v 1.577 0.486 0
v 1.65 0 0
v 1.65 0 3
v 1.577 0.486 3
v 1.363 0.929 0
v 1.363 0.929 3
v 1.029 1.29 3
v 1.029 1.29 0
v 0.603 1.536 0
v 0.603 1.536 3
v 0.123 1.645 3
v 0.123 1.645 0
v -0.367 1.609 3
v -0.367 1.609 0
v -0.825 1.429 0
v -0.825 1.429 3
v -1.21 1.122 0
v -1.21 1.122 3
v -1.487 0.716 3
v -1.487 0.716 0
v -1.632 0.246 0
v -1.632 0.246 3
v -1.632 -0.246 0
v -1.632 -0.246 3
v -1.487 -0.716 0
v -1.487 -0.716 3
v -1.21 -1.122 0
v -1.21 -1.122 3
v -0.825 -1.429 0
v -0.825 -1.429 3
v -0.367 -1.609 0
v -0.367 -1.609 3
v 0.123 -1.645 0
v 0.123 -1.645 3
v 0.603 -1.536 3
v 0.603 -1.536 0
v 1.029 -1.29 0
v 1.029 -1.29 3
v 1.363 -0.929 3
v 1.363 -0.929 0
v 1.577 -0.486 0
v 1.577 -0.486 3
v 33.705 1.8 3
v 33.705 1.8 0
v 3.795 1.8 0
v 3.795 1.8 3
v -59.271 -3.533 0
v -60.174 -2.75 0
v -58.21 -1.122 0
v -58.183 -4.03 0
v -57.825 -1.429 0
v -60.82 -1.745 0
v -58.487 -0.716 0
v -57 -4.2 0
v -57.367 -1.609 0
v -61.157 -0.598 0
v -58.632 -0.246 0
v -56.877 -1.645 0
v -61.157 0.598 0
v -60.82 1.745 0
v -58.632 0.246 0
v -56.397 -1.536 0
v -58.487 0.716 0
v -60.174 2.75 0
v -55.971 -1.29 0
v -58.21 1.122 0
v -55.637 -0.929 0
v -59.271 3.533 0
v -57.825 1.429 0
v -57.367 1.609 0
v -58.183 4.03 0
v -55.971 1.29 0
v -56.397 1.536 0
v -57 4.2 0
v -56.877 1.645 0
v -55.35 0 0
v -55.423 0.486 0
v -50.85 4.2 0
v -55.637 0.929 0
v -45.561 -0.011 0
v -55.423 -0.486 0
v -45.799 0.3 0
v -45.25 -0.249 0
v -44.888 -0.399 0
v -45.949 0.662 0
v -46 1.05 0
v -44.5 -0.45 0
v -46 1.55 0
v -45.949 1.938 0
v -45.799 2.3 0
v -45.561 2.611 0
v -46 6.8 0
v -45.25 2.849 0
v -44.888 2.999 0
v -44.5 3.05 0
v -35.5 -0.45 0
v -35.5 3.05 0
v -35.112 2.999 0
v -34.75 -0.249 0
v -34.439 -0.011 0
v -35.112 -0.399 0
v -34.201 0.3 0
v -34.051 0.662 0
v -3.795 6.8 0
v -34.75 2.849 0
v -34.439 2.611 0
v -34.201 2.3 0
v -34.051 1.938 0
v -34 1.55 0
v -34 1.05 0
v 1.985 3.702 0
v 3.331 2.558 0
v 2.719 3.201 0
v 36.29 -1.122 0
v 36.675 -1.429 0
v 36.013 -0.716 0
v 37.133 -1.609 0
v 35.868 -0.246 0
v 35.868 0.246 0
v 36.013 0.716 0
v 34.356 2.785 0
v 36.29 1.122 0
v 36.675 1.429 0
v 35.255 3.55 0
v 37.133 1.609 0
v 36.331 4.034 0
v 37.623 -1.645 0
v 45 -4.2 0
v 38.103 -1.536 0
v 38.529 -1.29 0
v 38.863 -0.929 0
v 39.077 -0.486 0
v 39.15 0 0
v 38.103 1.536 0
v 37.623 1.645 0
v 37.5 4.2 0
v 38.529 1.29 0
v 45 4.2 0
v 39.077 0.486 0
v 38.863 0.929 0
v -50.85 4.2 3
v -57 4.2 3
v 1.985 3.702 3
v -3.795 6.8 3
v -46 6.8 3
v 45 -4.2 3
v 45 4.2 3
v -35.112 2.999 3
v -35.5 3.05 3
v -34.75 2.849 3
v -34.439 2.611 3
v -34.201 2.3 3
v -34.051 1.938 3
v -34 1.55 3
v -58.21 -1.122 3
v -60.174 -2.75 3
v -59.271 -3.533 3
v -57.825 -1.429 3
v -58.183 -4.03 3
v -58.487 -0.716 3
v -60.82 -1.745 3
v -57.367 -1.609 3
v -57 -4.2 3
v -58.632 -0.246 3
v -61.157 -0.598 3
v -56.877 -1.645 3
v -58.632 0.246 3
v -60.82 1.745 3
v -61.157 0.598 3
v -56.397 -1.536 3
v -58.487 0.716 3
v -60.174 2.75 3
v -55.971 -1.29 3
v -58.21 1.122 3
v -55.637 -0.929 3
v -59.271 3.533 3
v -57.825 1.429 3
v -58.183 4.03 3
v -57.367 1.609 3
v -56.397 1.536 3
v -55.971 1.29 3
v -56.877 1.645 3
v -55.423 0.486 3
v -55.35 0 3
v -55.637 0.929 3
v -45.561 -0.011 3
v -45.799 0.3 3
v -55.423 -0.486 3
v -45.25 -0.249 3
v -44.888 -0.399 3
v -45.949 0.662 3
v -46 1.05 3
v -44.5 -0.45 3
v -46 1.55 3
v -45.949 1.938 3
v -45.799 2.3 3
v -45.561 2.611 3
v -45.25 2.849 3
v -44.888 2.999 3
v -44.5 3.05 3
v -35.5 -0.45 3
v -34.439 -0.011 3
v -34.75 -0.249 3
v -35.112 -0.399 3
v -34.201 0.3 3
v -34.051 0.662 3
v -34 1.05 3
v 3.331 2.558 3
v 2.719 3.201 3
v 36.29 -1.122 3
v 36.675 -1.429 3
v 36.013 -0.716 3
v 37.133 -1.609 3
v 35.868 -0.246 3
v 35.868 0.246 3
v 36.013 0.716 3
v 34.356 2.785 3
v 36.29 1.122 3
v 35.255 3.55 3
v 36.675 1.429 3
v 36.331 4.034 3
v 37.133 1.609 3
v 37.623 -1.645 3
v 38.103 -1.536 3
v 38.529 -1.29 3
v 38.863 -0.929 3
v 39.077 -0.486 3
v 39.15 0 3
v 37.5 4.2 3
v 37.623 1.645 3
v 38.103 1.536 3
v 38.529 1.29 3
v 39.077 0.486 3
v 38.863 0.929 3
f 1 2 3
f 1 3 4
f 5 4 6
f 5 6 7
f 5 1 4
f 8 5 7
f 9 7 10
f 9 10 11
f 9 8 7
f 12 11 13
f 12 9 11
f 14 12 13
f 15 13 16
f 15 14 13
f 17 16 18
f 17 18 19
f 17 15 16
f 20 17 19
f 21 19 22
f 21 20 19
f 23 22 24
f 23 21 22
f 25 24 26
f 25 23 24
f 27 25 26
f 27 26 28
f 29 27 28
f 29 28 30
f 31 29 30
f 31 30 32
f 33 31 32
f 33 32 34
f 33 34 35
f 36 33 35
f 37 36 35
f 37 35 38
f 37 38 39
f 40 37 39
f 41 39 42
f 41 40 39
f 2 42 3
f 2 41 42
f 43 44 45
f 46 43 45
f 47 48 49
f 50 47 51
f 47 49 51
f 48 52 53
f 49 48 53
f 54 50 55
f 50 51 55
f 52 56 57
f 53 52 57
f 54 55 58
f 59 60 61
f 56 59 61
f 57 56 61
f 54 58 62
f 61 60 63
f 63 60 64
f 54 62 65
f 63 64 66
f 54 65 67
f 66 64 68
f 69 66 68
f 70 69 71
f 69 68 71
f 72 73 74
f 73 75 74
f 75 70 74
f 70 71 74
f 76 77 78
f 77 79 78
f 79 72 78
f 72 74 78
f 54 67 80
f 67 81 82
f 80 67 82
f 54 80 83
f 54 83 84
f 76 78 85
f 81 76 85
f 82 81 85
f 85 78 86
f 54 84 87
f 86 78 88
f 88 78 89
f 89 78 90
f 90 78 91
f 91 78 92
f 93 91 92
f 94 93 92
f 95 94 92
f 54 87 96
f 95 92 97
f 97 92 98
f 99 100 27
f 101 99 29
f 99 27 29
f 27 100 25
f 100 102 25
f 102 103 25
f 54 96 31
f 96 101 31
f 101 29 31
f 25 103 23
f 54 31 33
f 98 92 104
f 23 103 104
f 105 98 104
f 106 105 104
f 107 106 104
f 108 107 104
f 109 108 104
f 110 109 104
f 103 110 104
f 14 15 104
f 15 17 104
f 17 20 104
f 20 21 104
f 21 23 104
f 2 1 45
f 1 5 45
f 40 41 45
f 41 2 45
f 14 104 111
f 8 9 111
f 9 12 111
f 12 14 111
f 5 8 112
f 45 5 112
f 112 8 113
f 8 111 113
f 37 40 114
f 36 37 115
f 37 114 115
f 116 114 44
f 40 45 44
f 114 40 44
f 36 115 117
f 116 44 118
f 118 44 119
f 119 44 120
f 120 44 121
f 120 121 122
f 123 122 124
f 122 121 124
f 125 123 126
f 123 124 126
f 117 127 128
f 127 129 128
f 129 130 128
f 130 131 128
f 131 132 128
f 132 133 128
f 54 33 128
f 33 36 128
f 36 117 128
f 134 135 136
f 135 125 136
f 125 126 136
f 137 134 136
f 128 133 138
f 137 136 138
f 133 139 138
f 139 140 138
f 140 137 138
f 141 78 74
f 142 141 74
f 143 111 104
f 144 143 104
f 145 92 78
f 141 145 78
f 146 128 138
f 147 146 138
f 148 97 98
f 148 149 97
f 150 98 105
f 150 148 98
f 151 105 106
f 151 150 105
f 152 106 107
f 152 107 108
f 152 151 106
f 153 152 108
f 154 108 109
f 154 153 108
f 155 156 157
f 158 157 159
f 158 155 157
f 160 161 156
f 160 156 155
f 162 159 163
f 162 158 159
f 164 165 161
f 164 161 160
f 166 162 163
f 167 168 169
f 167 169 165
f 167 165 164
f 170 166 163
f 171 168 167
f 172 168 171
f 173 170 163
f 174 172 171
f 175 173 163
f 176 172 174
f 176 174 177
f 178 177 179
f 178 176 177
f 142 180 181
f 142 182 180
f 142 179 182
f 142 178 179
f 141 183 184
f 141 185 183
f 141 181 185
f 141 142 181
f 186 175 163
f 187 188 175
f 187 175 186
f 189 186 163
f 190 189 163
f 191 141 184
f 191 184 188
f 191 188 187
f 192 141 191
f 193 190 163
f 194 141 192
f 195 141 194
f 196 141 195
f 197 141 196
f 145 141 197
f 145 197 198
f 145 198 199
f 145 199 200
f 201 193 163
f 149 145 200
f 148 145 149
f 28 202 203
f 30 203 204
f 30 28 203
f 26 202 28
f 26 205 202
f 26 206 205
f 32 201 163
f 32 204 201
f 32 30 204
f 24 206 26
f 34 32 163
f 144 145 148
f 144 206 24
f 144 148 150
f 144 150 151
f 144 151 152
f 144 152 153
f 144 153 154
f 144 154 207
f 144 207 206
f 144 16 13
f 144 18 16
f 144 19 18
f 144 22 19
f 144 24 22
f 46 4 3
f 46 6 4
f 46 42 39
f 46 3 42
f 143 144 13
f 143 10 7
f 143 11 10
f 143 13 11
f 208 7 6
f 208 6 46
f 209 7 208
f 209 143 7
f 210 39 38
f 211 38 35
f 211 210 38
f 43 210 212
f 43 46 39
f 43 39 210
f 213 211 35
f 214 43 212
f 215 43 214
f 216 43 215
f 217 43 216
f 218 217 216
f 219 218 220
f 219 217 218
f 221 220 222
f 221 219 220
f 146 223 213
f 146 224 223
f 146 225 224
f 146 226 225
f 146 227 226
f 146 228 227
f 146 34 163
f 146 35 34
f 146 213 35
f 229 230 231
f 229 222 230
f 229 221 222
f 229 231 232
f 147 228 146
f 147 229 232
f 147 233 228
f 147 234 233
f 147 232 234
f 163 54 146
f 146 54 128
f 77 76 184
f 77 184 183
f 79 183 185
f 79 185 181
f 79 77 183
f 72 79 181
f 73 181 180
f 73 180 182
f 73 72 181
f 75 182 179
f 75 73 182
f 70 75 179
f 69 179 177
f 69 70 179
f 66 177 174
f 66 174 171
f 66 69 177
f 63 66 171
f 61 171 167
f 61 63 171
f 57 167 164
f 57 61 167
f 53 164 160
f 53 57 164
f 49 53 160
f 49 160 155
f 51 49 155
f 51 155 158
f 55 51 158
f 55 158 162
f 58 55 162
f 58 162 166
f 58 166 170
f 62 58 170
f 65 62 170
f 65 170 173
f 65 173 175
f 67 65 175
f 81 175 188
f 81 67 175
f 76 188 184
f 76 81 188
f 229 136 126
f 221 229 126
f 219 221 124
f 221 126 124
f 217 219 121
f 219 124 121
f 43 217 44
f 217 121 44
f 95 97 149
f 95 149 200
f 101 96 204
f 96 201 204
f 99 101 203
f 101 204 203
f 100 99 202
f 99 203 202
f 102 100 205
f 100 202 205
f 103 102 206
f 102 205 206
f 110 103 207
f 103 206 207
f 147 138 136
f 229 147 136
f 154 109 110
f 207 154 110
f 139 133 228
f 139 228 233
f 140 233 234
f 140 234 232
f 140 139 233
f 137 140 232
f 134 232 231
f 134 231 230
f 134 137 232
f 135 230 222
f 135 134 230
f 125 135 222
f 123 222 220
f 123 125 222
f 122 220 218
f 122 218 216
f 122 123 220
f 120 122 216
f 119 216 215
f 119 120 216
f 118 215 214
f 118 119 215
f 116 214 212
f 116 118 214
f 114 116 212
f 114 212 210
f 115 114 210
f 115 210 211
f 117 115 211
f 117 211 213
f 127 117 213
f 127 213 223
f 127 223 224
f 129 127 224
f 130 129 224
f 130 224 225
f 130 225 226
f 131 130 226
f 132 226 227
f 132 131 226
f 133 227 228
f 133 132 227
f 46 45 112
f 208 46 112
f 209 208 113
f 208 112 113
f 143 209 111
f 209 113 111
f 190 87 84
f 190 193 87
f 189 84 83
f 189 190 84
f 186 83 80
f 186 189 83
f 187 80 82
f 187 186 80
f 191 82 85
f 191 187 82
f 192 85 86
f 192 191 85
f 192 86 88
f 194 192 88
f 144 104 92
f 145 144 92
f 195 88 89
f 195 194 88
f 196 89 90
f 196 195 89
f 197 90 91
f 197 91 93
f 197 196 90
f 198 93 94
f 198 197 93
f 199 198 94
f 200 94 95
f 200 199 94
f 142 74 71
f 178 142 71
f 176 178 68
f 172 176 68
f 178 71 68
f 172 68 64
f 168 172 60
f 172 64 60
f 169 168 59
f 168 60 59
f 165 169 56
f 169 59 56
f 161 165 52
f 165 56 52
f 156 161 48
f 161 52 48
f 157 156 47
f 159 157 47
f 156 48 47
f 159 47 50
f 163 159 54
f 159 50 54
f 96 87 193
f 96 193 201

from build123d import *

# Parameters (mm, degrees)
SKETCH1_R           = 1.65
BOSS_EXTRUDE1_DEPTH = 3
FILLET1_R           = 1.5


with BuildPart() as part:
    # Sketch1 → Boss-Extrude1 (new body)
    with BuildSketch(Plane.XY):
        with BuildLine():
            Line((-57, -4.2), (45, -4.2))
            Line((45, -4.2), (45, 4.2))
            Line((45, 4.2), (37.5, 4.2))
            ThreePointArc((37.5, 4.2), (35.255005568, 3.54964787), (33.705266808, 1.8))
            Line((33.705266808, 1.8), (3.794733192, 1.8))
            ThreePointArc((3.794733192, 1.8), (3.042029577, 2.89586879), (1.984520956, 3.701577579))
            Line((1.984520956, 3.701577579), (-3.794733192, 6.8))
            Line((-3.794733192, 6.8), (-46, 6.8))
            Line((-46, 6.8), (-50.849584319, 4.2))
            Line((-50.849584319, 4.2), (-57, 4.2))
            ThreePointArc((-57, 4.2), (-61.2, 0), (-57, -4.2))
        make_face()
        Circle(SKETCH1_R, mode=Mode.SUBTRACT)
        with Locations((-57, 0)):
            Circle(SKETCH1_R, mode=Mode.SUBTRACT)
        with Locations((37.5, 0)):
            Circle(SKETCH1_R, mode=Mode.SUBTRACT)
        Polygon((-46, -0.45), (-34, -0.45), (-34, 1.8), (-34, 3.05), (-46, 3.05), (-46, 1.8), align=None, mode=Mode.SUBTRACT)
    extrude(amount=BOSS_EXTRUDE1_DEPTH)

    # Fillet1
    fillet1_edges = [part.edges().sort_by_distance(p)[0] for p in [
        (-34, -0.45, 1.5),
        (-34, 3.05, 1.5),
        (-46, 3.05, 1.5),
        (-46, -0.45, 1.5),
    ]]
    fillet(fillet1_edges, radius=FILLET1_R)


solid = part.part
